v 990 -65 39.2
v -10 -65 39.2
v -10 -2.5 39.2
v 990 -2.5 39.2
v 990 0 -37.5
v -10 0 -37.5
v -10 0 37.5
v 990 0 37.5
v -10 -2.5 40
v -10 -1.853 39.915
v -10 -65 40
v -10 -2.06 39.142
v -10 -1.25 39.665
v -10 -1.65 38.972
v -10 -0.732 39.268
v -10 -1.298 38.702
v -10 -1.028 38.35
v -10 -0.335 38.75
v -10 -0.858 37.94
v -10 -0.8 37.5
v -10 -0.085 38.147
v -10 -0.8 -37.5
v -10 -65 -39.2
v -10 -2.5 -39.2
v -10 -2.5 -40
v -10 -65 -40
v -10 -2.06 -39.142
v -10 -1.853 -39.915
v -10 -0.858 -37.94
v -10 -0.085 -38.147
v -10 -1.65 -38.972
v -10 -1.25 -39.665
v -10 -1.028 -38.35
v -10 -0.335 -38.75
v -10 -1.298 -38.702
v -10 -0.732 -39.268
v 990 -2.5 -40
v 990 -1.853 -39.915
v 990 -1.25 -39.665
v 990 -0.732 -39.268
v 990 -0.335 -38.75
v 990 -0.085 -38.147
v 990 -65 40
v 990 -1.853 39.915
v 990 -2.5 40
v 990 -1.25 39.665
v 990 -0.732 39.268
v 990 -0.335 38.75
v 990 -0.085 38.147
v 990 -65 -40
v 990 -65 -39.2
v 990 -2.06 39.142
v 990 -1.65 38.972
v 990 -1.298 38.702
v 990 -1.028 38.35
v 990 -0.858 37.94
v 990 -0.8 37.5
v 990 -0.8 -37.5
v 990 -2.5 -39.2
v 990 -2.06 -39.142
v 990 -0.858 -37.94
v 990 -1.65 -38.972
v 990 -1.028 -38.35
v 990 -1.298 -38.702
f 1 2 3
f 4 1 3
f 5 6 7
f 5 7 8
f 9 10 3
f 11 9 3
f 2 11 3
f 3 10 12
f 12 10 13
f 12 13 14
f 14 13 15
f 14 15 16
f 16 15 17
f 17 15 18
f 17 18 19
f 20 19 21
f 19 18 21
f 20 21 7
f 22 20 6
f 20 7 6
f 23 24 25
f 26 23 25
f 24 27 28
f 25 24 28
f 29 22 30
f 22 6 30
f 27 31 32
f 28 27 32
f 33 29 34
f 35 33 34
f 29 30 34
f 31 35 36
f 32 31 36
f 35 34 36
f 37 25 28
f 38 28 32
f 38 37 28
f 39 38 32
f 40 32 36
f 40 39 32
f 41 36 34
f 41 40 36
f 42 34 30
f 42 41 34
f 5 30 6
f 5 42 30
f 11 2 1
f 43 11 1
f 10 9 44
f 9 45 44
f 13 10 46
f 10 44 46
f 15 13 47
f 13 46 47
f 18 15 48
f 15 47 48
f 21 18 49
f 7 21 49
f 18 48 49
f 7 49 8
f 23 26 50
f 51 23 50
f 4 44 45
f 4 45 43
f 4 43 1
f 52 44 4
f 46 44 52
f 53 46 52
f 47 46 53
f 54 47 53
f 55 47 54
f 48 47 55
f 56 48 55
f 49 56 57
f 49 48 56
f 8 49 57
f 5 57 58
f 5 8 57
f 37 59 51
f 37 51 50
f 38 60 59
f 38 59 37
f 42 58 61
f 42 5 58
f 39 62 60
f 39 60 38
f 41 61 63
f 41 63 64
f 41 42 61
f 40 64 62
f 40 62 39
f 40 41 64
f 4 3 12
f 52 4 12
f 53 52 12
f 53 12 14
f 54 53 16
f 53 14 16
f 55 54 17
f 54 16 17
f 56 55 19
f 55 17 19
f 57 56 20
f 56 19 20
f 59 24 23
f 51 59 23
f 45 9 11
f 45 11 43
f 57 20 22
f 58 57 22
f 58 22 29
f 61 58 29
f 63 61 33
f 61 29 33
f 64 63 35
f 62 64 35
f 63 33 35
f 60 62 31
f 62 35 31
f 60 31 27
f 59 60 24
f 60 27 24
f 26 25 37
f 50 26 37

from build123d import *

# Parameters (mm, degrees)
SKETCH1_W               = 1000
SKETCH1_H               = 80
BOSS_EXTRUDE1_DEPTH     = 65
FILLET1_R               = 2.5
CUT_EXTRUDE1_DEPTH      = 993.937560978
CUT_EXTRUDE1_DEPTH_BACK = 65


with BuildPart() as part:
    # Sketch1 → Boss-Extrude1 (new body)
    with BuildSketch(Plane(origin=(0, 0, 0), x_dir=(1, 0, 0), z_dir=(0, 1, 0))):
        with Locations((490, 0)):
            Rectangle(SKETCH1_W, SKETCH1_H)
    extrude(amount=-BOSS_EXTRUDE1_DEPTH)

    # Fillet1
    fillet1_edges = [part.edges().sort_by_distance(p)[0] for p in [
        (490, 0, 40),
        (490, 0, -40),
    ]]
    fillet(fillet1_edges, radius=FILLET1_R)

    # Sketch2 → Cut-Extrude1 (cut, two sides: drawn at the far end of the back side and taken through both)
    with BuildSketch(Plane(origin=(0, 0, 0), x_dir=(0, 0, -1), z_dir=(1, 0, 0)).offset(-CUT_EXTRUDE1_DEPTH_BACK)):
        with BuildLine():
            Line((39.2, -64.2), (39.2, -67.2))
            Line((39.2, -67.2), (-39.2, -67.2))
            Line((-39.2, -67.2), (-39.2, -64.2))
            Line((-39.2, -64.2), (-39.2, -2.5))
            ThreePointArc((-39.2, -2.5), (-38.702081528, -1.297918472), (-37.5, -0.8))
            Line((-37.5, -0.8), (37.5, -0.8))
            ThreePointArc((37.5, -0.8), (38.702081528, -1.297918472), (39.2, -2.5))
            Line((39.2, -2.5), (39.2, -64.2))
        make_face()
    extrude(amount=CUT_EXTRUDE1_DEPTH + CUT_EXTRUDE1_DEPTH_BACK, mode=Mode.SUBTRACT)


solid = part.part
